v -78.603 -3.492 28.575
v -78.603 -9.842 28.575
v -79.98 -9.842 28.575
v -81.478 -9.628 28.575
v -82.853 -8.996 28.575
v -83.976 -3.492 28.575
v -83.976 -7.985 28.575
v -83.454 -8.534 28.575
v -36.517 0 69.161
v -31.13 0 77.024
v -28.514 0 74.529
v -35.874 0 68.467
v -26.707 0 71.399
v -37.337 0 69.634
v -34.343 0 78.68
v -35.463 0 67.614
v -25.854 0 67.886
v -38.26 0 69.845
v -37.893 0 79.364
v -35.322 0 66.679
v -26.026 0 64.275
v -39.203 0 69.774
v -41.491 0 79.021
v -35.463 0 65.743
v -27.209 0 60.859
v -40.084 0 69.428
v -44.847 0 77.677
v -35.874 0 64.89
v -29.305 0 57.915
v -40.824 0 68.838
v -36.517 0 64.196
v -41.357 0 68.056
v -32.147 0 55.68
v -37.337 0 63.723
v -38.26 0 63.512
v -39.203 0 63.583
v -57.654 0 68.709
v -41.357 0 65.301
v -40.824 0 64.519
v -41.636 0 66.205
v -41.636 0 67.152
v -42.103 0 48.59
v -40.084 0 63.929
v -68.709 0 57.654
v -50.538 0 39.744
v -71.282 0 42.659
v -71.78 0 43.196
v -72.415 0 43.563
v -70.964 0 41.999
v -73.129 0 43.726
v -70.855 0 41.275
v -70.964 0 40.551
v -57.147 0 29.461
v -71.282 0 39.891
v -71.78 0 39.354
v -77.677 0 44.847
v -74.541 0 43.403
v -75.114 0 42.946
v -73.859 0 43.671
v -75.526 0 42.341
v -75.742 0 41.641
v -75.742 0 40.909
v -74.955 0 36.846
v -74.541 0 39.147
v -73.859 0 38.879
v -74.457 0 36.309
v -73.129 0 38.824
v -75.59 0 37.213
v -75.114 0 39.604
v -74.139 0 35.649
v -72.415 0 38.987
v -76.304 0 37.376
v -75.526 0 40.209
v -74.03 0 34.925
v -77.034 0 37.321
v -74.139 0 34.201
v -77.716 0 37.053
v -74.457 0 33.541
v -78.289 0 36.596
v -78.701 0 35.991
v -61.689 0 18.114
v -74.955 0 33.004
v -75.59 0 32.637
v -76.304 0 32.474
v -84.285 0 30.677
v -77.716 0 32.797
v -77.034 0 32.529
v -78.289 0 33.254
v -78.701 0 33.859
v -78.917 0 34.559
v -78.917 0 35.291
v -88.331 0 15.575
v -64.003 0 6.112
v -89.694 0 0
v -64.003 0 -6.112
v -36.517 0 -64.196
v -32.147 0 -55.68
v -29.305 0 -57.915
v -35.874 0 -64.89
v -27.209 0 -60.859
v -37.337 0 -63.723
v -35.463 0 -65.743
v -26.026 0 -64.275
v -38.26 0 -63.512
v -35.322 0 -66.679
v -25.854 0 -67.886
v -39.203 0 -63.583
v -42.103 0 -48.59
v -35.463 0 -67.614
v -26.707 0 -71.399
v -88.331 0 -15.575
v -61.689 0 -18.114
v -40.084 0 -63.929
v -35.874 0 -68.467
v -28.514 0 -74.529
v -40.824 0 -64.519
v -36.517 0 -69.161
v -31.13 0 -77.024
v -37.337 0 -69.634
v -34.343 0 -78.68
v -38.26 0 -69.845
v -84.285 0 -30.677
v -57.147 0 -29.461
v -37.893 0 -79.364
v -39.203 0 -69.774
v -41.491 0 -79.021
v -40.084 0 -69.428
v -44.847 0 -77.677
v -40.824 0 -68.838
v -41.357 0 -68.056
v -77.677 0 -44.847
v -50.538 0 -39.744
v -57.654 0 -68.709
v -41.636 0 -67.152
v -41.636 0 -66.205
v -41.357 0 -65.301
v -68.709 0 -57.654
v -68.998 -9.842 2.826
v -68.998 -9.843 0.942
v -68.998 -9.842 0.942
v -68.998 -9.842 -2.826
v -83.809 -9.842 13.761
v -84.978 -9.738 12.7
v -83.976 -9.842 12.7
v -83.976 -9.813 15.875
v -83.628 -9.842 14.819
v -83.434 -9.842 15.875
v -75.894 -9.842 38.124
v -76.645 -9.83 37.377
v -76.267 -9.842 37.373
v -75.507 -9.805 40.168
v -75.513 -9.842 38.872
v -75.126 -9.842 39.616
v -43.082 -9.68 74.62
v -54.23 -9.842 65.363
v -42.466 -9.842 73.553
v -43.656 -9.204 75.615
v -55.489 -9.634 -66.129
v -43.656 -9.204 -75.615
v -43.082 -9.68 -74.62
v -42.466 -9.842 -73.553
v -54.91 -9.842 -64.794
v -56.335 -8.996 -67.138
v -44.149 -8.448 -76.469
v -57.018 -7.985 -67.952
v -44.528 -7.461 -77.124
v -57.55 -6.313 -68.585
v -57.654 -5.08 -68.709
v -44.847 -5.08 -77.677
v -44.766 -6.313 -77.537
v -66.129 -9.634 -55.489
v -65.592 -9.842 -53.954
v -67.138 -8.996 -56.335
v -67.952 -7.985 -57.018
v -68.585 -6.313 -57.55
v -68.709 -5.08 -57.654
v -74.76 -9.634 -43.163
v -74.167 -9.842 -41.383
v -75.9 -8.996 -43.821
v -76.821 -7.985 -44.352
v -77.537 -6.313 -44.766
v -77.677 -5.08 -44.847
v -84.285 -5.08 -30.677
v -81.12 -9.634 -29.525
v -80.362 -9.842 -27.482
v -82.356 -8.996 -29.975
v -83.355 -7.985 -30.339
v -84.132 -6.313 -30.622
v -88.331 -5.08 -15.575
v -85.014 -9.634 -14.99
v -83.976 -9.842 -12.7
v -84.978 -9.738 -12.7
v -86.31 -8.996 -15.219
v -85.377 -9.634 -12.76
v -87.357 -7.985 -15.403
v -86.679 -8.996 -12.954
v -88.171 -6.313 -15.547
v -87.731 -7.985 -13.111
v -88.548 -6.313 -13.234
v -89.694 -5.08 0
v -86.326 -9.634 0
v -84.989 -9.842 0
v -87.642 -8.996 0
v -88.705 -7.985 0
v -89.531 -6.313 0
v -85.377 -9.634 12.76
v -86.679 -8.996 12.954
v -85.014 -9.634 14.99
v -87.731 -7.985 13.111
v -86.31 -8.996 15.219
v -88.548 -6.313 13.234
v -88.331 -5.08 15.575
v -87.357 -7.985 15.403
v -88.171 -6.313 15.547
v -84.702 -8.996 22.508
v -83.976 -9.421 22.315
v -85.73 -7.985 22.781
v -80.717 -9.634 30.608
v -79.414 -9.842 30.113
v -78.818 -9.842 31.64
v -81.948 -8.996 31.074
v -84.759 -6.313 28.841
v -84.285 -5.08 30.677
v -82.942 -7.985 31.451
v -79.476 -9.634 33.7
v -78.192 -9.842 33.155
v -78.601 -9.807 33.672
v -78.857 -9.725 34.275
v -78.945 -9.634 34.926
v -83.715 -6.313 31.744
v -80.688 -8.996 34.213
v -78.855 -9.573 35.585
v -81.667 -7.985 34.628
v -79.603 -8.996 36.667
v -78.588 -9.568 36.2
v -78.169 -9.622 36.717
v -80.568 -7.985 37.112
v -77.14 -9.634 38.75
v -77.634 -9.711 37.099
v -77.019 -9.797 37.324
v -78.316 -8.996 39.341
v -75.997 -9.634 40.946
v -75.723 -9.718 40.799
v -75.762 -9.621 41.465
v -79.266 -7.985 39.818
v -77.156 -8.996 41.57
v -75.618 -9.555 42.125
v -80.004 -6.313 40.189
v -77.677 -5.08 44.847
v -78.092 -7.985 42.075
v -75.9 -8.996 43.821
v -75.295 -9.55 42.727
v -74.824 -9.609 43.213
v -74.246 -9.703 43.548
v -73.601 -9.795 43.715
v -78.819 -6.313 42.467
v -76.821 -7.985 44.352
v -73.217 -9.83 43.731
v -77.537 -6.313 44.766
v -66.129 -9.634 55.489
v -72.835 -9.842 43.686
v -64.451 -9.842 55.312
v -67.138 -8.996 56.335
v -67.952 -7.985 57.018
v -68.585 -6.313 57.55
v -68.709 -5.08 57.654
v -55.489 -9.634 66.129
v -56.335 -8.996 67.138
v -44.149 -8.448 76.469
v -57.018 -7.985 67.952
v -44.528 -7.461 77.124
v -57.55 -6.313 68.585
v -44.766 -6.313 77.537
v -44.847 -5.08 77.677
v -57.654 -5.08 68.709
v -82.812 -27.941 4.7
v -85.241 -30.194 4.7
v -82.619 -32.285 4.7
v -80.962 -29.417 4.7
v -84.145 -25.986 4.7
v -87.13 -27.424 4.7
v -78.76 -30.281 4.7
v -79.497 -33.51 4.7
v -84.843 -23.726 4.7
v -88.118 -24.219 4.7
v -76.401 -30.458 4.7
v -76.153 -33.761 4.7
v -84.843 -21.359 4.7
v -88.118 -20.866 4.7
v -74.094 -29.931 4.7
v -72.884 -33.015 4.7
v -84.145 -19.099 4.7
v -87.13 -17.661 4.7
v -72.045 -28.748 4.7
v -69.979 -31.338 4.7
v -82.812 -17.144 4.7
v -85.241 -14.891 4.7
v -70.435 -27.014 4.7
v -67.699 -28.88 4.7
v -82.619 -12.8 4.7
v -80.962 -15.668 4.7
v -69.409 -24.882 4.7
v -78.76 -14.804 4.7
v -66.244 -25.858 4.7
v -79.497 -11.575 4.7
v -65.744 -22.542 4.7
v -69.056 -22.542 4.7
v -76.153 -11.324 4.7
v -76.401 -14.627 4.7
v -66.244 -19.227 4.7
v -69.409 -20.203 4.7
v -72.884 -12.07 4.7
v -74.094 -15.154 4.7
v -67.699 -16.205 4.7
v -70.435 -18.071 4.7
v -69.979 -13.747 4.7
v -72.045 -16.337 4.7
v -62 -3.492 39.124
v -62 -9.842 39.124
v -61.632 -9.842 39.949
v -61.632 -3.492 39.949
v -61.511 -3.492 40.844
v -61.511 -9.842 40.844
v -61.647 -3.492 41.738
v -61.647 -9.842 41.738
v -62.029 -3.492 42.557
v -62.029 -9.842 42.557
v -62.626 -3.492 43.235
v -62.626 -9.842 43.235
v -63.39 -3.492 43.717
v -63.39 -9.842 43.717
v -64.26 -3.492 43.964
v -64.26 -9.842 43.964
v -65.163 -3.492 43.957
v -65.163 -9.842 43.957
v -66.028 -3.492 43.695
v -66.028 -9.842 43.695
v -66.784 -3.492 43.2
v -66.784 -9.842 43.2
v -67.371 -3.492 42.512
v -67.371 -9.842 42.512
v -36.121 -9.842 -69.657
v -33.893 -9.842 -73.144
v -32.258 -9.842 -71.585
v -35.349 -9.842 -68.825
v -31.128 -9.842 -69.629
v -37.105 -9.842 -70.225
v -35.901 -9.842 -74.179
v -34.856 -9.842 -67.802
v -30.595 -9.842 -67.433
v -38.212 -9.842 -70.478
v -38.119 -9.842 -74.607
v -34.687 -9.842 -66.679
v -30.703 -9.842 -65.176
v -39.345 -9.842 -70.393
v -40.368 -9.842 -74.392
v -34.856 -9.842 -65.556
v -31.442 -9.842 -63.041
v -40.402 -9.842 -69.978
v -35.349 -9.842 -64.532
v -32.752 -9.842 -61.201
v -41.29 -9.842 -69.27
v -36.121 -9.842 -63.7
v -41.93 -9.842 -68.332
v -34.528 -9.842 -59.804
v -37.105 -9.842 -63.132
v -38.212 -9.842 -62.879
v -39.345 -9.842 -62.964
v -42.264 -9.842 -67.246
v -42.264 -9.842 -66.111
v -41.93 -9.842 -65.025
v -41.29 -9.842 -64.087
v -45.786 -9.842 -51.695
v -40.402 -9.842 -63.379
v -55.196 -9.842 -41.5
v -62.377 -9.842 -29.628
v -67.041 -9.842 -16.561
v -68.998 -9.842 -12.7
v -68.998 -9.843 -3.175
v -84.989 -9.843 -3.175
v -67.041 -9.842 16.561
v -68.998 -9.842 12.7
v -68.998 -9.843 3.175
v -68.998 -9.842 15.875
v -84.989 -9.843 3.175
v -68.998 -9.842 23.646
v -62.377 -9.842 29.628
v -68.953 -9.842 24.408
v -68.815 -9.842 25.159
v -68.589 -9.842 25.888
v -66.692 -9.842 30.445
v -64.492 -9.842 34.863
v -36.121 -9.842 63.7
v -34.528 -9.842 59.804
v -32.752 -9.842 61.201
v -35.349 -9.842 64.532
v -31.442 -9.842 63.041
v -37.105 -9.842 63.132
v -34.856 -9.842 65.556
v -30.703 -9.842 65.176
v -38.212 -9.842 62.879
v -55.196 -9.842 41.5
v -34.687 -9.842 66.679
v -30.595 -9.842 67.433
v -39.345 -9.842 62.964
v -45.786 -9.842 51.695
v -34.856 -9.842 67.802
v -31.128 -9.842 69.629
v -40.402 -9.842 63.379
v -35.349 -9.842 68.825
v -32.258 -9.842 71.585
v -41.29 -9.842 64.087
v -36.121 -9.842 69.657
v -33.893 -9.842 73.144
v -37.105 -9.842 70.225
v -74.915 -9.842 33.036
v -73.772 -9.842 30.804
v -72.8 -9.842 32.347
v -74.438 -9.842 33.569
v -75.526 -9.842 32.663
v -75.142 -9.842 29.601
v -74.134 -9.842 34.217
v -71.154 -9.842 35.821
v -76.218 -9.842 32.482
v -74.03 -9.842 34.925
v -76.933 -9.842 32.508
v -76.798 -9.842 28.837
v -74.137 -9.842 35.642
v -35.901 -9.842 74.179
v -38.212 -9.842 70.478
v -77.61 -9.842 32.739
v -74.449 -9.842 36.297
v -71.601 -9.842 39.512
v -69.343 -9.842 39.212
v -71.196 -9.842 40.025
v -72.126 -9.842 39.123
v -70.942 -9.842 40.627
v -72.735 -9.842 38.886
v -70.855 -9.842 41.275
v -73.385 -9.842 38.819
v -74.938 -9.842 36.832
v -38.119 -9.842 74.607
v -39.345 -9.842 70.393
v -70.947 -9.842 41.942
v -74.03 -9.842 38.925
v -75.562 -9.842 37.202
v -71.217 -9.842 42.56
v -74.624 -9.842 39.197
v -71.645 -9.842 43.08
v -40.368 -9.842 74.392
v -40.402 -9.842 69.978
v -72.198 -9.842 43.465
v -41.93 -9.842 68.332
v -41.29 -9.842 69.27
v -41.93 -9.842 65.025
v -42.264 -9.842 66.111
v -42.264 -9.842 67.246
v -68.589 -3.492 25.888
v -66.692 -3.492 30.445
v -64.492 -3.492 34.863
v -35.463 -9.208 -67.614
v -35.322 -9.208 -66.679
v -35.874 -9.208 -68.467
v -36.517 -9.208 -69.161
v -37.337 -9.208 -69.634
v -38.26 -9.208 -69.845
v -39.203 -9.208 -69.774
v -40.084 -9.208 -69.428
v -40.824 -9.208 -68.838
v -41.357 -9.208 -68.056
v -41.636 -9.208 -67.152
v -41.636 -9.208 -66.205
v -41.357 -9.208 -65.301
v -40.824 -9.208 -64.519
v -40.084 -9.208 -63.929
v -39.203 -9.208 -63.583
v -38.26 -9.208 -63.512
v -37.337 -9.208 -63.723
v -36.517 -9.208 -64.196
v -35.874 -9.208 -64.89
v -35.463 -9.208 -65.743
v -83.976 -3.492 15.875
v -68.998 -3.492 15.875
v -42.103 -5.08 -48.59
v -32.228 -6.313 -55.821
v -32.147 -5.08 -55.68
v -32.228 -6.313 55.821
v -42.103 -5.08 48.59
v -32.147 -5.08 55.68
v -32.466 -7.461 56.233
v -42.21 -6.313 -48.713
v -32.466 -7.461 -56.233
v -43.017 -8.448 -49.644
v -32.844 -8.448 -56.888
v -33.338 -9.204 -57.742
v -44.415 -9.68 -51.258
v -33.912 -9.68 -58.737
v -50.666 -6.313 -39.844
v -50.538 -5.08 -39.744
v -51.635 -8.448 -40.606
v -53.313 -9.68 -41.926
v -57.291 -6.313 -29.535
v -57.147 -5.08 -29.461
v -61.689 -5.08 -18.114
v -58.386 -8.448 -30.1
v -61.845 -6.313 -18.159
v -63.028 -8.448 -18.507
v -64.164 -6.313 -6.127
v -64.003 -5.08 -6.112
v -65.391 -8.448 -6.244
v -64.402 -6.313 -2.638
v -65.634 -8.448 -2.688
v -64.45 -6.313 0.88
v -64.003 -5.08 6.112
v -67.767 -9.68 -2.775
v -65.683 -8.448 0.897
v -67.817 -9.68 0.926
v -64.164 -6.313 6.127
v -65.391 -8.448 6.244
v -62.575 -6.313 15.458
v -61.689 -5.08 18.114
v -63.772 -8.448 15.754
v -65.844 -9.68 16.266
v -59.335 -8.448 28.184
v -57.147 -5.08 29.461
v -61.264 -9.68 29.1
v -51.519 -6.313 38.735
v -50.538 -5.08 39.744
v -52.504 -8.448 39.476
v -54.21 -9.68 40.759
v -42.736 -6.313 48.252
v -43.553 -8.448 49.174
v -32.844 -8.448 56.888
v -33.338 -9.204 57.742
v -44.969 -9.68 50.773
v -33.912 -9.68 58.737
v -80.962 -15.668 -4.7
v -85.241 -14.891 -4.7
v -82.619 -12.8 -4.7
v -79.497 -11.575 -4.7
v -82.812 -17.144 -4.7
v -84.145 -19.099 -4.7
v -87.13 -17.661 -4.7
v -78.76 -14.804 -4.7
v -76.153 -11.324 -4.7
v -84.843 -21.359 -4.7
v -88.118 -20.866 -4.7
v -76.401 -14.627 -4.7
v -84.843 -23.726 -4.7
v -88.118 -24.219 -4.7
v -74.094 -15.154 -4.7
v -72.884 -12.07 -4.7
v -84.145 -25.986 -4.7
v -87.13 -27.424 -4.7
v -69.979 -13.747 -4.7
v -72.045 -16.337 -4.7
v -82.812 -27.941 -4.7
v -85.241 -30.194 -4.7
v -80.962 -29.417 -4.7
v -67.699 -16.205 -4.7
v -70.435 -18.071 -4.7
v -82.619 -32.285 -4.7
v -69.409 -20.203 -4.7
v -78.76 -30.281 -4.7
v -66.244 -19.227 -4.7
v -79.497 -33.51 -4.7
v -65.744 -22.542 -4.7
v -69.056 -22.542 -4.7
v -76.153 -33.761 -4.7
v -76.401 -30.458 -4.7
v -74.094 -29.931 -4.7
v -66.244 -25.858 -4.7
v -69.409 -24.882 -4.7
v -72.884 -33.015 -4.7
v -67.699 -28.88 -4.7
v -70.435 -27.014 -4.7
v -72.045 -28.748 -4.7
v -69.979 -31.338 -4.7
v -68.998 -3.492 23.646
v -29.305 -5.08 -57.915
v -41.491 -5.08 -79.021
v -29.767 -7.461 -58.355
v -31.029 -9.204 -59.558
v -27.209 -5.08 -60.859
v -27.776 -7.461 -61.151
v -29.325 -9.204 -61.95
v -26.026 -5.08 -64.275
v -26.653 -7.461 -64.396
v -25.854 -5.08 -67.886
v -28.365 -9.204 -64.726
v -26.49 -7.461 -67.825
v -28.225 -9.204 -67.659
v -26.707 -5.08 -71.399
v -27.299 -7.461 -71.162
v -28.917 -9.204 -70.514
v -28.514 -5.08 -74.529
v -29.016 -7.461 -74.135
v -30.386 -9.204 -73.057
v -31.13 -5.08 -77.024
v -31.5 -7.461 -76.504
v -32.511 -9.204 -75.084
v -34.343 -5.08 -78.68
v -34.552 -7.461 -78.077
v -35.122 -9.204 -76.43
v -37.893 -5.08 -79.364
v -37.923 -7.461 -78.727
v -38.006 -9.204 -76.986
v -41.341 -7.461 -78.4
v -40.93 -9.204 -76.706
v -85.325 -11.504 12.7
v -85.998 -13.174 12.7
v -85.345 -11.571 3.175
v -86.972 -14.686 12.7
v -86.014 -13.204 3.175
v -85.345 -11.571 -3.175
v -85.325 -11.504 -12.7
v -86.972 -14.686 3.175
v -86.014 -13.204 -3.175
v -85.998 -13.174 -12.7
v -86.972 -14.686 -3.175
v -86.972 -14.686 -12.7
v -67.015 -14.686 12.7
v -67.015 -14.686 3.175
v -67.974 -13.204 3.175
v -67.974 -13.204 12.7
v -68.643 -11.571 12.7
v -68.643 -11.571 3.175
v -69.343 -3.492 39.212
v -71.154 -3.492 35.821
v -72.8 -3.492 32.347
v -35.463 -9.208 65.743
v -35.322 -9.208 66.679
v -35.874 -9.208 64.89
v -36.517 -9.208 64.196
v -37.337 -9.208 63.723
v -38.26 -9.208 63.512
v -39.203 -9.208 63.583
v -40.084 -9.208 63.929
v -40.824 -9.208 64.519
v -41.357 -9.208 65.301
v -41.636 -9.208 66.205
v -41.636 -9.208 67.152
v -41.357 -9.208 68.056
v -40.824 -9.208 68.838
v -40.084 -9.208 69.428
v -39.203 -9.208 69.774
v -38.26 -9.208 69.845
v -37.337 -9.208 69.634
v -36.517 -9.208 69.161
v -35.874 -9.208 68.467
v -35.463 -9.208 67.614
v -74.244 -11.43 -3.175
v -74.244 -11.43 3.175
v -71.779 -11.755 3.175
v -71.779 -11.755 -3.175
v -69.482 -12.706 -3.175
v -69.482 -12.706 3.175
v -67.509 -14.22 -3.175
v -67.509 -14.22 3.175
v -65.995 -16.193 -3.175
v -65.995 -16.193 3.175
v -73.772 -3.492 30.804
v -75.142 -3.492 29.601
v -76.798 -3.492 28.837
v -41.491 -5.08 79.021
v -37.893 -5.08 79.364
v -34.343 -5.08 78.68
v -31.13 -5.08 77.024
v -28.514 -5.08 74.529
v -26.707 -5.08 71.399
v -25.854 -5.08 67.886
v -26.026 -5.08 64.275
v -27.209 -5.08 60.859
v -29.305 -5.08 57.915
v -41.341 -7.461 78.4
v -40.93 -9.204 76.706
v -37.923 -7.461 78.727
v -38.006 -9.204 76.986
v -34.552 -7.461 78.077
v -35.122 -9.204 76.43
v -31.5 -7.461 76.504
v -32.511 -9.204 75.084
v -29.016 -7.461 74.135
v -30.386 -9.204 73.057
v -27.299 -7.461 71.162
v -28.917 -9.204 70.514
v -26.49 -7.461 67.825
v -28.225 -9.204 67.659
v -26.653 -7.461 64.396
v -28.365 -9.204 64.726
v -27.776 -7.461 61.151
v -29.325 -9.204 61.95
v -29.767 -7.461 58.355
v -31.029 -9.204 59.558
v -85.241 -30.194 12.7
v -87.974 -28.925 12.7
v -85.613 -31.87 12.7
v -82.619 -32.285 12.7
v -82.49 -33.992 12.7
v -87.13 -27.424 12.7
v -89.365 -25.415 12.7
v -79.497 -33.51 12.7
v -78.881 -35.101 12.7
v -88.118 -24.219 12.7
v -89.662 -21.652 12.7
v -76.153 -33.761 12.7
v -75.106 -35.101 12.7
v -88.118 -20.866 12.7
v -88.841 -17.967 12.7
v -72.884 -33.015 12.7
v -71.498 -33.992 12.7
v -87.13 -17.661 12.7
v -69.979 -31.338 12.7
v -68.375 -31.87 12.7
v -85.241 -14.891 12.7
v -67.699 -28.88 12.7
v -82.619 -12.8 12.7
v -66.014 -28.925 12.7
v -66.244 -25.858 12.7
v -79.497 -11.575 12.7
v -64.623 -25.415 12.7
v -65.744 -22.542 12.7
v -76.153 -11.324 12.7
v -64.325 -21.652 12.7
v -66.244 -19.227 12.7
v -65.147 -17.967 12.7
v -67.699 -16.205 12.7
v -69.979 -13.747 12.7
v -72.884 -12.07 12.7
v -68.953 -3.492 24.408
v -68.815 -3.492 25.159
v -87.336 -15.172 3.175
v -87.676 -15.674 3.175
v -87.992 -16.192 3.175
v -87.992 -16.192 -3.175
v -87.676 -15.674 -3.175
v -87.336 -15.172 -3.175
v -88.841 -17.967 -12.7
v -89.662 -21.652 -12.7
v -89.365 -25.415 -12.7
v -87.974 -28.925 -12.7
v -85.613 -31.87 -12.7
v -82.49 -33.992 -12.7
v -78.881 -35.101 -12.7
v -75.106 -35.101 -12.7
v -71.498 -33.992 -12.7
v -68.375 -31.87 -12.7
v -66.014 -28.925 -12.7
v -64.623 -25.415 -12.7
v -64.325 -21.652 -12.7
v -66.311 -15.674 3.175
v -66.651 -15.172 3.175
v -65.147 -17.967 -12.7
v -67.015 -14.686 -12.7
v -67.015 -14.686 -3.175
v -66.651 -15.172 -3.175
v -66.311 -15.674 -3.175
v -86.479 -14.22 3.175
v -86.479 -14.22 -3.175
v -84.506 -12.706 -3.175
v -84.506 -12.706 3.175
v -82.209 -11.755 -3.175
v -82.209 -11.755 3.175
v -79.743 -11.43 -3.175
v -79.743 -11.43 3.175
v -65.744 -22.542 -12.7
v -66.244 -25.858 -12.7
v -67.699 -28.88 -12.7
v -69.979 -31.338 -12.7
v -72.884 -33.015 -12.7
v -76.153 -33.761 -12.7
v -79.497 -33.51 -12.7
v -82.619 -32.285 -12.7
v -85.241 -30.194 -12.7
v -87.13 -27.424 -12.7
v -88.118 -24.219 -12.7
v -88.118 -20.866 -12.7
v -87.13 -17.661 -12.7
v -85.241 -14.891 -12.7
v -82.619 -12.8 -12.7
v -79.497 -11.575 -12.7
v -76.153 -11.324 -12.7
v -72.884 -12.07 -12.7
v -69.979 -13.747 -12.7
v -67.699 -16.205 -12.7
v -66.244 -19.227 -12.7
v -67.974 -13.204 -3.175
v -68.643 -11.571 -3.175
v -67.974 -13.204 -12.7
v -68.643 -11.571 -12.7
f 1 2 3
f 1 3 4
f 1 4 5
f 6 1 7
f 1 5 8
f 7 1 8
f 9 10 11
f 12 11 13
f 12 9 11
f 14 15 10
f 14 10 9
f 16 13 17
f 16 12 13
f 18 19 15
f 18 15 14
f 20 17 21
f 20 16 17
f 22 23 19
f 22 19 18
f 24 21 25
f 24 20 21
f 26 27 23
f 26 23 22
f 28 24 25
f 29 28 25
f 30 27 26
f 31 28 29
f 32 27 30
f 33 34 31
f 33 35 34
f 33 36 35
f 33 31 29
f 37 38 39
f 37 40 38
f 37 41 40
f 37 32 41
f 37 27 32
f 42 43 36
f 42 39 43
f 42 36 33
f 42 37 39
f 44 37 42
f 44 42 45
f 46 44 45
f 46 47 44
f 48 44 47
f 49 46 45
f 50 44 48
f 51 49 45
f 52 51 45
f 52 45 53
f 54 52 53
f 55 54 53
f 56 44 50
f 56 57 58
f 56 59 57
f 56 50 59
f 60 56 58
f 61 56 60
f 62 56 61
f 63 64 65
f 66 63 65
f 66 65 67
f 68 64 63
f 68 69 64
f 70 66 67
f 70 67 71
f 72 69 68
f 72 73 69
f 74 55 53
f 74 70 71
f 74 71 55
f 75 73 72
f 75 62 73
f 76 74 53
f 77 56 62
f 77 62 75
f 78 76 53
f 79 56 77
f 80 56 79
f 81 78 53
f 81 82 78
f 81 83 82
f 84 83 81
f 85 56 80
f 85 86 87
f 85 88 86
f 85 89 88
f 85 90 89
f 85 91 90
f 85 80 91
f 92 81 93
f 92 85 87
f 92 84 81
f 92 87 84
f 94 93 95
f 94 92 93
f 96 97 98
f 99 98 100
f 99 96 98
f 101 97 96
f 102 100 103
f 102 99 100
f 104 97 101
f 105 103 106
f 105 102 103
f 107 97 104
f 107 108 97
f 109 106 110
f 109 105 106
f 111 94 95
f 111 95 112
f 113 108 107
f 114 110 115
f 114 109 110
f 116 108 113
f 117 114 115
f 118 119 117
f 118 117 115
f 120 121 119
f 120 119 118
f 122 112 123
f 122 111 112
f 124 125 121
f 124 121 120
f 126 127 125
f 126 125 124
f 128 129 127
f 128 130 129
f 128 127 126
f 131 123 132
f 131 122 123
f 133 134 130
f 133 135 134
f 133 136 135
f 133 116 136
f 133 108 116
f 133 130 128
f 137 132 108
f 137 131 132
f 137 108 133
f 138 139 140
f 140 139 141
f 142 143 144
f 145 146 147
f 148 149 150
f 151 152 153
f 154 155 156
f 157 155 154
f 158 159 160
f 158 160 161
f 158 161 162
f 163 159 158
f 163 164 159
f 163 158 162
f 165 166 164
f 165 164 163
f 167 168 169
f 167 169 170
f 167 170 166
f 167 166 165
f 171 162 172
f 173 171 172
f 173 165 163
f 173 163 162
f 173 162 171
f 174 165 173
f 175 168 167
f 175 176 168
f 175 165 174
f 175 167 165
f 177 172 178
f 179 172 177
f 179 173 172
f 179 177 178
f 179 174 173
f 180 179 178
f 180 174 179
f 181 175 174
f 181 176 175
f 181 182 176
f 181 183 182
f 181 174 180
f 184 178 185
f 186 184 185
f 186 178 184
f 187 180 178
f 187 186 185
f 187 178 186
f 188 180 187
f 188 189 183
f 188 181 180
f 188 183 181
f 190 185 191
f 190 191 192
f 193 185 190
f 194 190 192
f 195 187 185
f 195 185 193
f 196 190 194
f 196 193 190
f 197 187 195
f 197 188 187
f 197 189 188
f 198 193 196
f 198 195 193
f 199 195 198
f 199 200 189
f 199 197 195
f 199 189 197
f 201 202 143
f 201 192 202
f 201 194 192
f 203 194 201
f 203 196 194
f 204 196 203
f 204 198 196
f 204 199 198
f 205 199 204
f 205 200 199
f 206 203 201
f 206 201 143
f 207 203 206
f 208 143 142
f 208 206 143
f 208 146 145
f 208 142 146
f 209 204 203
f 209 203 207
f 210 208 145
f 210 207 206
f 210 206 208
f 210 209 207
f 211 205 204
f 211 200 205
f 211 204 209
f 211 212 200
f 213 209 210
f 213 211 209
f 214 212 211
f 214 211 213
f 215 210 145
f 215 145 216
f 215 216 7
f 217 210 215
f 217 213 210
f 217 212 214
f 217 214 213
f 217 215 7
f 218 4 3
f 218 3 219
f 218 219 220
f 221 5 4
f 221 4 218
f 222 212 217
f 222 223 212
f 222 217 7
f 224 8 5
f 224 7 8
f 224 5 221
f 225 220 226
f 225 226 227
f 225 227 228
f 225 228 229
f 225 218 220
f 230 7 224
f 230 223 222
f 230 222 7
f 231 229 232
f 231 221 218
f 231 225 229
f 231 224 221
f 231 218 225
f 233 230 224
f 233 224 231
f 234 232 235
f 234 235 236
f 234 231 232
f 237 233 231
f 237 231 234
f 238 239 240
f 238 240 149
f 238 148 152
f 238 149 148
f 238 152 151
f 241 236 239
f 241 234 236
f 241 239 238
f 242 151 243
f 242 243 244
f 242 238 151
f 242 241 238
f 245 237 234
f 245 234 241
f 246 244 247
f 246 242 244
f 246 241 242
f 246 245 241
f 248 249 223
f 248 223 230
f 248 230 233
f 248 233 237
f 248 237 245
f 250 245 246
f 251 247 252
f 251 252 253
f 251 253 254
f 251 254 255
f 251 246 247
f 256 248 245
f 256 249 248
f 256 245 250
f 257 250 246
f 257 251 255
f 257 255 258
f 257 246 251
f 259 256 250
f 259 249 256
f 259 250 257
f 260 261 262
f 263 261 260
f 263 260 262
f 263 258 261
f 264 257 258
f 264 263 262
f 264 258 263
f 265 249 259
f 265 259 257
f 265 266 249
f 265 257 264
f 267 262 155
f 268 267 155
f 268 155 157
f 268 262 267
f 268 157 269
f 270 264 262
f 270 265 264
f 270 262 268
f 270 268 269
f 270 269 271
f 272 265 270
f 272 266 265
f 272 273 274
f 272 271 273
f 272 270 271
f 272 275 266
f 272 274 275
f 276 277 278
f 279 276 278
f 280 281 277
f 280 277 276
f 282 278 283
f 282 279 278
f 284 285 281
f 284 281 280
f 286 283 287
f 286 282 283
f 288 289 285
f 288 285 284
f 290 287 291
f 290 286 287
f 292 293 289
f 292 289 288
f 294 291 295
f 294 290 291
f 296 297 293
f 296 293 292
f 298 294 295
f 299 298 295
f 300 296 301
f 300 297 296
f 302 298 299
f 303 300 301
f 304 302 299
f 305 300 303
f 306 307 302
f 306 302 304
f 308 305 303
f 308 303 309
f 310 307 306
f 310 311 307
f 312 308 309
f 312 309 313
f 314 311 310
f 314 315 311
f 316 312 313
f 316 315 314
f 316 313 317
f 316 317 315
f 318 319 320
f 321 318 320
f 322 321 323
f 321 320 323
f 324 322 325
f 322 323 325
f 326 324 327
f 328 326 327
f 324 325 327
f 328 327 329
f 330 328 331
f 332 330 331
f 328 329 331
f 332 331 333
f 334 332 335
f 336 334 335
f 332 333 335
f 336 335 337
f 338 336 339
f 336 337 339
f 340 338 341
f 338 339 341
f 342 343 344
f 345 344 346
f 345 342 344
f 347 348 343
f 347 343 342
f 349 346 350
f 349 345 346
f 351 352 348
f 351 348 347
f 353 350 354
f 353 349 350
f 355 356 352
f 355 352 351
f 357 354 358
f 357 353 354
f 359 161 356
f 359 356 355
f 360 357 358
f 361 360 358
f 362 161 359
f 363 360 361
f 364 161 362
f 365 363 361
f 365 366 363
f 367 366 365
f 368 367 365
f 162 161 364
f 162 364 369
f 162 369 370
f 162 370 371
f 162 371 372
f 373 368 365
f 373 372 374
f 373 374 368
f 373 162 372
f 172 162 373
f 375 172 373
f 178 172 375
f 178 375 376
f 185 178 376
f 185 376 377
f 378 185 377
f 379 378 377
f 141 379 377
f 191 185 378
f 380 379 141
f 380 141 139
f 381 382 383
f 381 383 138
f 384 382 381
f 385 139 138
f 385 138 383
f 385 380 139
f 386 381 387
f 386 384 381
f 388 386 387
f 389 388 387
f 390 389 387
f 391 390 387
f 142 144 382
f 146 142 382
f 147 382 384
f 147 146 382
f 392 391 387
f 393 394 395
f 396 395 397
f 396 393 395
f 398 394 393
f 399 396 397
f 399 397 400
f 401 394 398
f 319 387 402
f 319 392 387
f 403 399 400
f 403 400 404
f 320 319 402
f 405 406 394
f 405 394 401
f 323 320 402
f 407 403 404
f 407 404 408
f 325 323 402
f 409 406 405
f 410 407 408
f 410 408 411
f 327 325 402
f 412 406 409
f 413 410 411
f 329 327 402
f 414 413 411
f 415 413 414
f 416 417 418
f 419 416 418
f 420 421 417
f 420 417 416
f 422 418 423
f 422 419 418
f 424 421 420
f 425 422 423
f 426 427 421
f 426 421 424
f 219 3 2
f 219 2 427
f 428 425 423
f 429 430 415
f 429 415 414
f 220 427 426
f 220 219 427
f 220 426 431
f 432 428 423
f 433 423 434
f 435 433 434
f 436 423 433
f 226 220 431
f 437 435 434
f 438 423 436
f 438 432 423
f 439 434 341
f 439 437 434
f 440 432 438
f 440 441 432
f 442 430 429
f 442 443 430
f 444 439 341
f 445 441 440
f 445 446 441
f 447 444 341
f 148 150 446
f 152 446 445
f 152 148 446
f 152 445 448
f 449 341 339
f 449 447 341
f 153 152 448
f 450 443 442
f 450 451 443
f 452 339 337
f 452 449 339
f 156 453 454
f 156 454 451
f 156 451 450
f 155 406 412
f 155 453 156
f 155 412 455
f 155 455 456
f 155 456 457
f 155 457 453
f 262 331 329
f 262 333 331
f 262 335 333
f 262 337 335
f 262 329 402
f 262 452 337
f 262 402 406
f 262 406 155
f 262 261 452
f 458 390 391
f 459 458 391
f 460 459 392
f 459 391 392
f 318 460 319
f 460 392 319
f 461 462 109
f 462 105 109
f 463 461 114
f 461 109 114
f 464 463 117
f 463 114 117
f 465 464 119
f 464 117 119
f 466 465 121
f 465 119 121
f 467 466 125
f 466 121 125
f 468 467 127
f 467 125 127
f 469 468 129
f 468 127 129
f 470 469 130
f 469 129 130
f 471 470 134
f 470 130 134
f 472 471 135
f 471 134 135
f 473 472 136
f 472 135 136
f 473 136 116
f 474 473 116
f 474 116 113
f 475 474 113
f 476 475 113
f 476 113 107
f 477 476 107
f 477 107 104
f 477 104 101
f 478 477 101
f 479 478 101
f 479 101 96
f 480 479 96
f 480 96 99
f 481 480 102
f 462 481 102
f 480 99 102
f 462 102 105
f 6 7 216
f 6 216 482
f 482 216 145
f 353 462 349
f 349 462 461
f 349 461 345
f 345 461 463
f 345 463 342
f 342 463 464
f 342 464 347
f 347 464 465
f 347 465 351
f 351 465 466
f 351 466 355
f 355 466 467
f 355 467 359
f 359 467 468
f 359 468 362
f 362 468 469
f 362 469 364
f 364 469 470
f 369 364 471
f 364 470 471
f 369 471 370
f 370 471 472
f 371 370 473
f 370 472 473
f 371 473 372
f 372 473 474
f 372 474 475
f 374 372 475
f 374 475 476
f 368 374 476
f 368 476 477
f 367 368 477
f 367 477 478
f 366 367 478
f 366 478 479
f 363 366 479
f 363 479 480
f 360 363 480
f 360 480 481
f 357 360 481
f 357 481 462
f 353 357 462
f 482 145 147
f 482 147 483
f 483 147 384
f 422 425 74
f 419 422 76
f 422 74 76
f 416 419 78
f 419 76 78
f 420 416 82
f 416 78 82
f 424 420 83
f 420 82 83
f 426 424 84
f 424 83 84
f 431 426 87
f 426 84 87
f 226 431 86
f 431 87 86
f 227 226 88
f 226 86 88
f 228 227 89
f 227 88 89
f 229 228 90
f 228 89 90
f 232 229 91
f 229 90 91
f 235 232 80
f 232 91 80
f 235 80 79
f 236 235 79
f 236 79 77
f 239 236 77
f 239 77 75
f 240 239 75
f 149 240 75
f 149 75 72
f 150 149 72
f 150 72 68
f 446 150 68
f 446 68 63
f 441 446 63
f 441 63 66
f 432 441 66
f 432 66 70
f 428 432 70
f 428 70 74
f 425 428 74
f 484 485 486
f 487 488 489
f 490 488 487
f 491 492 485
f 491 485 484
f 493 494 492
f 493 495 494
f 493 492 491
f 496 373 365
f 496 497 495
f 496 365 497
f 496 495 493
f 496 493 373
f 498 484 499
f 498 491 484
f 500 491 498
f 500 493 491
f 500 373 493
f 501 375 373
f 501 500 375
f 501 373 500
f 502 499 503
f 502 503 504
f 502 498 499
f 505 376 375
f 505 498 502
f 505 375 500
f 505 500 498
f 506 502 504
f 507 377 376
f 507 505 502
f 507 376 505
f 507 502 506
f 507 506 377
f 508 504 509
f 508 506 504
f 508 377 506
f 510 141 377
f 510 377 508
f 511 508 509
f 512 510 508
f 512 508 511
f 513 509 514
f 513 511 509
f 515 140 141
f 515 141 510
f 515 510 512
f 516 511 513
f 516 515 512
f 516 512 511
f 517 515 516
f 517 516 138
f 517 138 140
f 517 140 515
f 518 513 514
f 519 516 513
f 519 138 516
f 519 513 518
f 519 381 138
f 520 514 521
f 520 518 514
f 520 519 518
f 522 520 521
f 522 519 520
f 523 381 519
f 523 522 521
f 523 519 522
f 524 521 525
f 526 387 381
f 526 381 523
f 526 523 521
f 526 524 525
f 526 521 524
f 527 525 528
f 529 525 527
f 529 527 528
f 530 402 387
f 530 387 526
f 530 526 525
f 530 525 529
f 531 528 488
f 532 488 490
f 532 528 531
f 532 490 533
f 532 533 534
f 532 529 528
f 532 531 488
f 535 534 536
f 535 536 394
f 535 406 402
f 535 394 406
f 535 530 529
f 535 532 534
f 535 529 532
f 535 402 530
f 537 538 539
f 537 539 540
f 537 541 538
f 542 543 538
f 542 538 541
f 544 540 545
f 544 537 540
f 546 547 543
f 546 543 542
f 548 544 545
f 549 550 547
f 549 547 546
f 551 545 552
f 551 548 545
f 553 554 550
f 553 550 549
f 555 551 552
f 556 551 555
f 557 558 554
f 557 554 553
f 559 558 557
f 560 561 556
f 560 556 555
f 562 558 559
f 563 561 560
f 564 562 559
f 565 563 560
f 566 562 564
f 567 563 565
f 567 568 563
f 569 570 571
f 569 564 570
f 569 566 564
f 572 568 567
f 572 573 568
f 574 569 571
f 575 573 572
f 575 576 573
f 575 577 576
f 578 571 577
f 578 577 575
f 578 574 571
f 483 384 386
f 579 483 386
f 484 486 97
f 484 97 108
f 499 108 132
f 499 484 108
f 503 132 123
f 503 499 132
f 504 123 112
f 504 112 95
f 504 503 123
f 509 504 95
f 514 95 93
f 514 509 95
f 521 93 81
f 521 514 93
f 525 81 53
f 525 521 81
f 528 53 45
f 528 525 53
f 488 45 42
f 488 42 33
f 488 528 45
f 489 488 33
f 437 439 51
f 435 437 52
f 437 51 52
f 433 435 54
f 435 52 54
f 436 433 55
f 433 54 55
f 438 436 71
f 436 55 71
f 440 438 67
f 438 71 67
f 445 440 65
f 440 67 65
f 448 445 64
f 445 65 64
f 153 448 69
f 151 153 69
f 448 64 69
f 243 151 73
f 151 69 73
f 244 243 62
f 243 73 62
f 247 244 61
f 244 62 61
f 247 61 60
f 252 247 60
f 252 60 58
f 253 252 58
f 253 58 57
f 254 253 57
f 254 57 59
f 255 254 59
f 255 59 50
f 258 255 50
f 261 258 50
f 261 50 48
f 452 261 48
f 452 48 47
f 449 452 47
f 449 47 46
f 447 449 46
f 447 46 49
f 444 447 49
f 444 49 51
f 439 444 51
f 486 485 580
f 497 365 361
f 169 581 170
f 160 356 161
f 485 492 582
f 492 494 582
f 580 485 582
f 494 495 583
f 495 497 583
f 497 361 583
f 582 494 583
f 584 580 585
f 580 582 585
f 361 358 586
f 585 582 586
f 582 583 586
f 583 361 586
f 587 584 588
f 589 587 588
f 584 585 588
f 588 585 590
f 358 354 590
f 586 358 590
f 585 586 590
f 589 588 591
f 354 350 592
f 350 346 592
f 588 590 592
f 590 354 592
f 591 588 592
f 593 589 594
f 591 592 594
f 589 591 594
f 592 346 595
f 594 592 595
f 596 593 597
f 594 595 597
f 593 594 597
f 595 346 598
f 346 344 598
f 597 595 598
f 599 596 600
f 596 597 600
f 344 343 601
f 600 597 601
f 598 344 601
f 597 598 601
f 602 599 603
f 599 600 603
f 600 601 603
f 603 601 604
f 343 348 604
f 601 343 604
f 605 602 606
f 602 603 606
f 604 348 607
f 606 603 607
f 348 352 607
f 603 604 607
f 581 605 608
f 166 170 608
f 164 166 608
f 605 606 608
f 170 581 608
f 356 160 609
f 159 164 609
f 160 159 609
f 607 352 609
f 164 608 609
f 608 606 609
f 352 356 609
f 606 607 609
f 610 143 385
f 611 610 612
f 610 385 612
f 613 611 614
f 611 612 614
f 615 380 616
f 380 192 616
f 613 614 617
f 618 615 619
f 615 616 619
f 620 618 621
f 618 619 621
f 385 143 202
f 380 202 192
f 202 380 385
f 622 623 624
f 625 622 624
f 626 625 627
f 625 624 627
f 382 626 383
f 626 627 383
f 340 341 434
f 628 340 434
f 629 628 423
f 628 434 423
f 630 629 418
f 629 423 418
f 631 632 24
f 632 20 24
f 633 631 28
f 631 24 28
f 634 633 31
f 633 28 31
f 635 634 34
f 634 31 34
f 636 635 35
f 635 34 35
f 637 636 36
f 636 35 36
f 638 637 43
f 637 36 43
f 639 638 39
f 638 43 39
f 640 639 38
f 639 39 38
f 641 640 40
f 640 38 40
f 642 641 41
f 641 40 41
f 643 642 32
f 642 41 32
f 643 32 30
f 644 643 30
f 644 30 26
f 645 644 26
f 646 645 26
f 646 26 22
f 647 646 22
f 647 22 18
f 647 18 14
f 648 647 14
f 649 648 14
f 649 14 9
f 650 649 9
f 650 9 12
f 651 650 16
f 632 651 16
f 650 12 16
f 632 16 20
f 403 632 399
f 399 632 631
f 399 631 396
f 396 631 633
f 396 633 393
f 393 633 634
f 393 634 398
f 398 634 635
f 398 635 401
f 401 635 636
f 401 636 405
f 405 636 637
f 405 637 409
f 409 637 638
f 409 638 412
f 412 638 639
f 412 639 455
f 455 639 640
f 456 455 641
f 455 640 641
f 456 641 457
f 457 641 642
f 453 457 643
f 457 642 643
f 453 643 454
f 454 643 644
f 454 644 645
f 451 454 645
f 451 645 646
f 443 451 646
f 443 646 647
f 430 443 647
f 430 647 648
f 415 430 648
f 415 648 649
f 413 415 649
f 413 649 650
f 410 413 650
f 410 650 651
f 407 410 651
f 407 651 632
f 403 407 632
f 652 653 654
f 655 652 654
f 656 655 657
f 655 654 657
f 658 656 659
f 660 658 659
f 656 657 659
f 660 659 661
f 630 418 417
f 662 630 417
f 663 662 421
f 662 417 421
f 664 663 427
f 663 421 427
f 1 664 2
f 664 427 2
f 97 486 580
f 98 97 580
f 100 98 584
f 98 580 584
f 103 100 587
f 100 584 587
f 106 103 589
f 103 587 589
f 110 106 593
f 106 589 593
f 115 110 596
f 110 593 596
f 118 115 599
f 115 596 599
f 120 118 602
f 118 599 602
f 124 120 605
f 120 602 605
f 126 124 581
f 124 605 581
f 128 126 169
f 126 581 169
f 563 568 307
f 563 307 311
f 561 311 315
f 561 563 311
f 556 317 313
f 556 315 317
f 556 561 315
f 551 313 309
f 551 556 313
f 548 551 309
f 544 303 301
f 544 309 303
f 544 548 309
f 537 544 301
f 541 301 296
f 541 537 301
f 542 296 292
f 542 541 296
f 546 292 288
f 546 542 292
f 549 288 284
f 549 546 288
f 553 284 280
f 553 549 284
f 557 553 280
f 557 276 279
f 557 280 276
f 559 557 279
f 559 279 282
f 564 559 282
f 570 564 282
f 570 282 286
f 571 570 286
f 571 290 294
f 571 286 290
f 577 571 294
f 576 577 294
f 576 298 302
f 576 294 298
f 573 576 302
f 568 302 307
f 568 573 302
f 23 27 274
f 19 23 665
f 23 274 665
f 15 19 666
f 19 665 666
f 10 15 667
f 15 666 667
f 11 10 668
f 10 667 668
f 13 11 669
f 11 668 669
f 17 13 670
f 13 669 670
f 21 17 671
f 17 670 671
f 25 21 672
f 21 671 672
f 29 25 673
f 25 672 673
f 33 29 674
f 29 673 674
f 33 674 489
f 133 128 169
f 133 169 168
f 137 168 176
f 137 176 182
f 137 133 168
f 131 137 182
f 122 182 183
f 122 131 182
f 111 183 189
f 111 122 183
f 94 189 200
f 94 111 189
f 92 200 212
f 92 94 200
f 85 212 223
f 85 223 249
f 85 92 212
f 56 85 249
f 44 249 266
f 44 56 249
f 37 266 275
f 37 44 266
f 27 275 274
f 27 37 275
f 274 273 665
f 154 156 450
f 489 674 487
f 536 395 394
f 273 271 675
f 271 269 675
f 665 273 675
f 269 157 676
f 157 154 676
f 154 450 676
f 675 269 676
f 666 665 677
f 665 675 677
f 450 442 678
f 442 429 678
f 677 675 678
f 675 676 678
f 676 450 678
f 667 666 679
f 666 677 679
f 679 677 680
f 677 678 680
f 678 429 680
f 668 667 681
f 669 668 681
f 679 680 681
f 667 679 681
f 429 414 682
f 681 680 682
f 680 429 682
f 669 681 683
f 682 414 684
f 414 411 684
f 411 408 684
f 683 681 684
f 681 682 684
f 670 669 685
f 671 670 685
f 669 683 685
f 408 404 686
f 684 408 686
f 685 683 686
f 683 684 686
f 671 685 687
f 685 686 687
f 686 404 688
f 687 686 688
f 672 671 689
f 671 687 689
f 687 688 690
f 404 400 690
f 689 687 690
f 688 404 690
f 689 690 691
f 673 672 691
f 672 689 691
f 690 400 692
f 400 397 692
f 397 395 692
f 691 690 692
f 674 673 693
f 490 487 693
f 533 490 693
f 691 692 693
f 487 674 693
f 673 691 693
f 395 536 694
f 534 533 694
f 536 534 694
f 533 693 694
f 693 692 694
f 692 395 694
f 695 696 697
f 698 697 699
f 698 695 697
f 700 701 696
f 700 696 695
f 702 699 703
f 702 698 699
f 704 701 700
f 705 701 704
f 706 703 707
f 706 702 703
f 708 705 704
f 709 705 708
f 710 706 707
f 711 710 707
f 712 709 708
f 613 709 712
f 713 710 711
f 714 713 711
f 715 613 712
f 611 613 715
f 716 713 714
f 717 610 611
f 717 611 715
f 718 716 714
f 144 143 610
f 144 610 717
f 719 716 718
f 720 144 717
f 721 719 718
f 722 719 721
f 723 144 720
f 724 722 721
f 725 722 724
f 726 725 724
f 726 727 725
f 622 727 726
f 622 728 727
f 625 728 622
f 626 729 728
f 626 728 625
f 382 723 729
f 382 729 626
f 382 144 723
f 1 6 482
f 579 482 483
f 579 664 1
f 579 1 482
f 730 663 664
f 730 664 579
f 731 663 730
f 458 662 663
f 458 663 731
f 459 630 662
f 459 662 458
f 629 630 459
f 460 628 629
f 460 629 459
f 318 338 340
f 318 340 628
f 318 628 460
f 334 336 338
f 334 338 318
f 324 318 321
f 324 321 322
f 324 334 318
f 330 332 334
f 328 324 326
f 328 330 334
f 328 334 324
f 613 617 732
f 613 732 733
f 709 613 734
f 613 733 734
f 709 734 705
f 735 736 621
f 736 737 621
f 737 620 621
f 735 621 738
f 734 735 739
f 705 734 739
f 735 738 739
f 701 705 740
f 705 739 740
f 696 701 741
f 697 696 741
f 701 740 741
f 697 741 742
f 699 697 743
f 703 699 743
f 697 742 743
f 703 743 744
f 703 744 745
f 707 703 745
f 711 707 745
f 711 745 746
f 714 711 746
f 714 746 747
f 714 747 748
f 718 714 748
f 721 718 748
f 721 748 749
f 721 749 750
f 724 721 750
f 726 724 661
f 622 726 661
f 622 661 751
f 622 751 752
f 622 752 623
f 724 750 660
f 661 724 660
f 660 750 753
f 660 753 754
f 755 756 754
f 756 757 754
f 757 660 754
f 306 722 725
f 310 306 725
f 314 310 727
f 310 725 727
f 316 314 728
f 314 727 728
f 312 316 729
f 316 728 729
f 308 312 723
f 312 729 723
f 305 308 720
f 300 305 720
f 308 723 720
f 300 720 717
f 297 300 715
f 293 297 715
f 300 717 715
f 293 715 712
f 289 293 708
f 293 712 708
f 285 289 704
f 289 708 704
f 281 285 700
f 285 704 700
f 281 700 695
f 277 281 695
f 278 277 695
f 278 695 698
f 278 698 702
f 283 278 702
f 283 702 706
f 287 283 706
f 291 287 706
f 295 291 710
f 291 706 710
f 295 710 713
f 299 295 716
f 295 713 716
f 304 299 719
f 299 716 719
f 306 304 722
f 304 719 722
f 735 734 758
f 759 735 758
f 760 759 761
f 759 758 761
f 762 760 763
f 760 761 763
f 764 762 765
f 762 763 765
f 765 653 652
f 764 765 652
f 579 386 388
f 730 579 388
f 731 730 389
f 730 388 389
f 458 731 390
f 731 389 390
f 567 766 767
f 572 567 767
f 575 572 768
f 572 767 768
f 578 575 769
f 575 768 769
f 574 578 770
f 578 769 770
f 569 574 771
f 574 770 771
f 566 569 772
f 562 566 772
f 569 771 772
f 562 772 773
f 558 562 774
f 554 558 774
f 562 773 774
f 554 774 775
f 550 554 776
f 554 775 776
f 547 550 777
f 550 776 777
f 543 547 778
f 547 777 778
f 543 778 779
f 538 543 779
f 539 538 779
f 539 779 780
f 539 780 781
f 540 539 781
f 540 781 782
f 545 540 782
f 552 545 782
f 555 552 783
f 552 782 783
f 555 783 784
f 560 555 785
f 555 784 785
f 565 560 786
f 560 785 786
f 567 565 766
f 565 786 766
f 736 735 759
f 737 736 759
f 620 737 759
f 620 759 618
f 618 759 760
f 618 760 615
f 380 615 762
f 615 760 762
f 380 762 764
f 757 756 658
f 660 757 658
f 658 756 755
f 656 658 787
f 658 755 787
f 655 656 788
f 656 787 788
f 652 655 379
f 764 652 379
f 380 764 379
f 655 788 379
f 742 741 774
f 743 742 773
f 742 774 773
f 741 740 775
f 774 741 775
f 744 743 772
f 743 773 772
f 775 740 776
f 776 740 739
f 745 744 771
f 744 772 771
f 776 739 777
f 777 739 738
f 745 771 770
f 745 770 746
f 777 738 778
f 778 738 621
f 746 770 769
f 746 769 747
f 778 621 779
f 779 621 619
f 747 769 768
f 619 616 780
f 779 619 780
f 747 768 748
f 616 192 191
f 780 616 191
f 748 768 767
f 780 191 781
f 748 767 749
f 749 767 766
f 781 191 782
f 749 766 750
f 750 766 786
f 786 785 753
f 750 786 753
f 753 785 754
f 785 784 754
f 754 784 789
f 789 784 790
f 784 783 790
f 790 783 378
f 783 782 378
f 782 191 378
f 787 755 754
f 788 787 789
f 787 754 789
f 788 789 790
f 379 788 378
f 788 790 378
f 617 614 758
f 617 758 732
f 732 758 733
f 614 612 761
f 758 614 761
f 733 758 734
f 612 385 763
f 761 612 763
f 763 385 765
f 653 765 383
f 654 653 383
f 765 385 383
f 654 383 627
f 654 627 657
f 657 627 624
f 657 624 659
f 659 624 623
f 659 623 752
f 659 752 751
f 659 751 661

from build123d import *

# Parameters (mm, degrees)
SENSORARMATURE_DEPTH                  = 12.7
SENSORARMATURE_DEPTH_BACK             = 12.7
SKETCH2_R                             = 7.9375
SKETCH2_R_2                           = 4
SKETCH2_R_3                           = 2.38125
SKETCH15_R                            = 11.25
BEARINGRACE1_DEPTH                    = 8
SKETCH16_R                            = 11.25
BEARINGRACE2_DEPTH                    = 8
CUT_EXTRUDE3_DEPTH                    = 188.895496905
FILLET1_R                             = 9.525
MAINSENSORINSET_DEPTH                 = 6.35
F_10_0_1935_DIAMETER_HOLE1_D          = 4.9149
F_1_4_0_25_DIAMETER_HOLE1_D           = 6.35
F_1_4_0_25_DIAMETER_HOLE1_CSINK_D     = 7.62
F_1_4_0_25_DIAMETER_HOLE1_CSINK_ANGLE = 90
CUT_EXTRUDE6_DEPTH                    = 132.65094541
CUT_EXTRUDE6_DEPTH_BACK               = 132.65094541
FILLET2_ANGLE                         = 180
FILLET2_2_ANGLE                       = 180


with BuildPart() as part:
    # Sketch1 → MainAttachmentRing (revolve)
    with BuildSketch(Plane.XY, mode=Mode.PRIVATE) as mainattachmentring_sk:
        with BuildLine():
            Line((-64.29375, 0), (-64.29375, -5.08))
            ThreePointArc((-64.29375, -5.08), (-65.688653955, -8.447596045), (-69.05625, -9.8425))
            Line((-69.05625, -9.8425), (-84.93125, -9.8425))
            ThreePointArc((-84.93125, -9.8425), (-88.298846045, -8.447596045), (-89.69375, -5.08))
            Line((-89.69375, -5.08), (-89.69375, 0))
            Line((-89.69375, 0), (-64.29375, 0))
        make_face()
    revolve(mainattachmentring_sk.sketch.rotate(Axis((0, -6.614583333, 0), (0, 1, 0)), 270), axis=Axis((0, -6.614583333, 0), (0, 1, 0)))

    # Sketch2 → SensorArmature (add, two sides: drawn at the far end of the back side and taken through both)
    # profile 1 of 2: a face of its own
    with BuildSketch(Plane.XY.offset(-SENSORARMATURE_DEPTH_BACK)):
        with BuildLine():
            Line((-69.05625, -8.794346715), (-69.05625, -3.4925))
            Line((-69.05625, -3.4925), (-84.93125, -3.4925))
            Line((-84.93125, -3.4925), (-84.93125, -8.794346715))
            ThreePointArc((-84.93125, -8.794346715), (-85.455970986, -11.912134822), (-86.972321429, -14.686412409))
            ThreePointArc((-86.972321429, -14.686412409), (-76.99375, -35.2425), (-67.015178571, -14.686412409))
            ThreePointArc((-67.015178571, -14.686412409), (-68.531529014, -11.912134822), (-69.05625, -8.794346715))
        make_face()
        with Locations((-76.99375, -22.5425)):
            Circle(SKETCH2_R, mode=Mode.SUBTRACT)
    # profile 2 of 2: a face of its own
    with BuildSketch(Plane.XY.offset(-SENSORARMATURE_DEPTH_BACK)):
        with Locations((-76.99375, -22.5425)):
            Circle(SKETCH2_R_2)
        with Locations((-76.99375, -22.5425)):
            Circle(SKETCH2_R_3, mode=Mode.SUBTRACT)
    extrude(amount=SENSORARMATURE_DEPTH + SENSORARMATURE_DEPTH_BACK)


with BuildPart() as sensorarmature_kept_piece:
    # of the separate pieces the step leaves, the one the design keeps (sensorarmature_pieces_kept)
    add(part.part.solids().sort_by_distance((0, 0, -64.29375))[0])

    # Sketch15 → BearingRace1 (cut)
    with BuildSketch(Plane.XY.offset(12.7)):
        with Locations((-76.99375, -22.5425)):
            Circle(SKETCH15_R)
    extrude(amount=-BEARINGRACE1_DEPTH, mode=Mode.SUBTRACT)

    # Sketch16 → BearingRace2 (cut)
    with BuildSketch(Plane(origin=(0, 0, -12.7), x_dir=(-1, 0, 0), z_dir=(0, 0, -1))):
        with Locations(Location((76.99375, -22.5425, 0), (0, 0, 180))):
            Circle(SKETCH16_R)
    extrude(amount=-BEARINGRACE2_DEPTH, mode=Mode.SUBTRACT)

    # Sketch17 → Cut-Extrude3 (cut, through all)
    with BuildSketch(Plane(origin=(65.0875, 22.225, 0), x_dir=(0, 0, 1), z_dir=(-1, 0, 0))):
        with BuildLine():
            Line((2.825941823, -32.0675), (3.175, -32.0675))
            Line((3.175, -32.0675), (3.175, -33.655))
            Line((3.175, -33.655), (-3.175, -33.655))
            Line((-3.175, -33.655), (-3.175, -32.0675))
            Line((-3.175, -32.0675), (-2.825941823, -32.0675))
            add(Edge.make_bspline(
                [(-2.825941823, -32.0675), (-0.941980608, -32.0675), (0.941980608, -32.0675), (2.825941823, -32.0675)],
                knots=[0, 0, 0, 0, 1, 1, 1, 1], degree=3))
        make_face()
    extrude(amount=CUT_EXTRUDE3_DEPTH, mode=Mode.SUBTRACT)

    # Fillet1
    # the kernel refuses this fillet: 9.525 mm, written as the material it takes off along each edge
    with BuildSketch(Plane(origin=(-68.684334549, -11.43, 3.175), x_dir=(-1, 0, 0), z_dir=(0, 0, -1))) as fillet1_piece_1:
        with BuildLine():
            CenterArc((5.559784794, -9.525), FILLET1_R, 90, 60)
            Line((-2.689107177, -4.7625), (-3.513996374, -4.28625))
            ThreePointArc((-3.513996374, -4.28625), (-2.417548835, -2.667205839), (-0.915308455, 0.263565329))
            Line((-0.915308455, 0.263565329), (0, 0.9525))
            Line((0, 0.9525), (5.559784794, 0.9525))
            Line((5.559784794, 0.9525), (5.559784794, 0))
        make_face()
    extrude(amount=6.35, mode=Mode.SUBTRACT)
    with BuildSketch(Plane(origin=(-85.303165451, -11.43, 3.175), x_dir=(1, 0, 0), z_dir=(0, 0, -1))) as fillet1_piece_2:
        with BuildLine():
            CenterArc((5.559784794, 9.525), FILLET1_R, 210, 60)
            Line((-2.689107177, 4.7625), (-3.513996374, 4.28625))
            ThreePointArc((-3.513996374, 4.28625), (-2.417548835, 2.667205839), (-0.915308455, -0.263565329))
            Line((-0.915308455, -0.263565329), (0, -0.9525))
            Line((0, -0.9525), (5.559784794, -0.9525))
            Line((5.559784794, -0.9525), (5.559784794, 0))
        make_face()
    extrude(amount=6.35, mode=Mode.SUBTRACT)

    # Sketch19 → MainSensorInset (cut)
    with BuildSketch(Plane.XZ.offset(9.8425)):
        with BuildLine():
            Line((-83.97634921, 15.875), (-68.998403727, 15.875))
            Line((-68.998403727, 15.875), (-68.998403727, 23.64608578))
            ThreePointArc((-68.998403727, 23.64608578), (-68.895293758, 24.785763339), (-68.589312408, 25.888429207))
            ThreePointArc((-68.589312408, 25.888429207), (-65.62931995, 32.672571163), (-62.000346171, 39.123670816))
            ThreePointArc((-62.000346171, 39.123670816), (-62.991085358, 43.50313264), (-67.370547181, 42.512393453))
            ThreePointArc((-67.370547181, 42.512393453), (-70.269181894, 37.52780703), (-72.79966532, 32.346606528))
            ThreePointArc((-72.79966532, 32.346606528), (-75.142159242, 29.600748947), (-78.602628968, 28.575))
            Line((-78.602628968, 28.575), (-83.97634921, 28.575))
            Line((-83.97634921, 28.575), (-83.97634921, 15.875))
        make_face()
    extrude(amount=-MAINSENSORINSET_DEPTH, mode=Mode.SUBTRACT)

    # #10 (0.1935) Diameter Hole1 (through all)
    with Locations(Plane(origin=(0, -9.8425, 0), x_dir=(-1, 0, 0), z_dir=(0, -1, 0))):
        with Locations((73.312376468, -41.275), (76.487376468, -34.925)):
            Hole(F_10_0_1935_DIAMETER_HOLE1_D / 2)

    # 1/4 (0.25) Diameter Hole1 (through all)
    with Locations(Plane(origin=(0, -9.8425, 0), x_dir=(-1, 0, 0), z_dir=(0, -1, 0))):
        with Locations((-76.99375, 0), (38.496875, 66.678543433), (38.496875, -66.678543433), (0, 0)):
            CounterSinkHole(F_1_4_0_25_DIAMETER_HOLE1_D / 2, F_1_4_0_25_DIAMETER_HOLE1_CSINK_D / 2, counter_sink_angle=F_1_4_0_25_DIAMETER_HOLE1_CSINK_ANGLE)

    # Sketch28 → Cut-Extrude6 (cut, two sides: drawn at the far end of the back side and taken through both)
    with BuildSketch(Plane(origin=(0, 0, 0), x_dir=(1, 0, 0), z_dir=(0, 1, 0)).offset(-CUT_EXTRUDE6_DEPTH_BACK)):
        with BuildLine():
            Line((0, 0), (-32.146875, 55.680020805))
            ThreePointArc((-32.146875, 55.680020805), (-27.498352372, 73.028543433), (-44.846875, 77.677066061))
            Line((-44.846875, 77.677066061), (-52.641298624, 91.177403793))
            Line((-52.641298624, 91.177403793), (62.971207783, 117.188002958))
            Line((62.971207783, 117.188002958), (148.903396654, 11.630273141))
            Line((148.903396654, 11.630273141), (-6.989072656, -155.463930645))
            Line((-6.989072656, -155.463930645), (-55.413884825, -95.979663962))
            Line((-55.413884825, -95.979663962), (-44.846875, -77.677066061))
            ThreePointArc((-44.846875, -77.677066061), (-27.498352372, -73.028543433), (-32.146875, -55.680020805))
            Line((-32.146875, -55.680020805), (0, 0))
        make_face()
    extrude(amount=CUT_EXTRUDE6_DEPTH + CUT_EXTRUDE6_DEPTH_BACK, mode=Mode.SUBTRACT)

    # Fillet2: read off the stored shape, not the designer's step
    # Fillet2 outline → Fillet2 (revolve, cut)
    with BuildSketch(Plane(origin=(-38.496875, 0, 66.678543433), x_dir=(-0.4999999999999933, 0, 0.8660254037844425), z_dir=(-0.8660254037844425, 0, -0.4999999999999933))):
        with BuildLine():
            ThreePointArc((12.7, -5.08), (11.305096045, -8.447596045), (7.9375, -9.8425))
            Line((7.9375, -9.8425), (12.7, -9.8425))
            Line((12.7, -9.8425), (12.7, -5.08))
        make_face()
    revolve(axis=Axis((-38.496875, 0, 66.678543433), (0, 1, 0)), revolution_arc=FILLET2_ANGLE, mode=Mode.SUBTRACT)

    # Fillet2 2 outline → Fillet2 2 (revolve, cut)
    with BuildSketch(Plane(origin=(-38.496875, 0, -66.678543433), x_dir=(0.4999999999999988, 0, 0.8660254037844394), z_dir=(-0.8660254037844394, 0, 0.4999999999999988))):
        with BuildLine():
            ThreePointArc((12.7, -5.08), (11.305096045, -8.447596045), (7.9375, -9.8425))
            Line((7.9375, -9.8425), (12.7, -9.8425))
            Line((12.7, -9.8425), (12.7, -5.08))
        make_face()
    revolve(axis=Axis((-38.496875, 0, -66.678543433), (0, 1, 0)), revolution_arc=FILLET2_2_ANGLE, mode=Mode.SUBTRACT)


solid = sensorarmature_kept_piece.part
